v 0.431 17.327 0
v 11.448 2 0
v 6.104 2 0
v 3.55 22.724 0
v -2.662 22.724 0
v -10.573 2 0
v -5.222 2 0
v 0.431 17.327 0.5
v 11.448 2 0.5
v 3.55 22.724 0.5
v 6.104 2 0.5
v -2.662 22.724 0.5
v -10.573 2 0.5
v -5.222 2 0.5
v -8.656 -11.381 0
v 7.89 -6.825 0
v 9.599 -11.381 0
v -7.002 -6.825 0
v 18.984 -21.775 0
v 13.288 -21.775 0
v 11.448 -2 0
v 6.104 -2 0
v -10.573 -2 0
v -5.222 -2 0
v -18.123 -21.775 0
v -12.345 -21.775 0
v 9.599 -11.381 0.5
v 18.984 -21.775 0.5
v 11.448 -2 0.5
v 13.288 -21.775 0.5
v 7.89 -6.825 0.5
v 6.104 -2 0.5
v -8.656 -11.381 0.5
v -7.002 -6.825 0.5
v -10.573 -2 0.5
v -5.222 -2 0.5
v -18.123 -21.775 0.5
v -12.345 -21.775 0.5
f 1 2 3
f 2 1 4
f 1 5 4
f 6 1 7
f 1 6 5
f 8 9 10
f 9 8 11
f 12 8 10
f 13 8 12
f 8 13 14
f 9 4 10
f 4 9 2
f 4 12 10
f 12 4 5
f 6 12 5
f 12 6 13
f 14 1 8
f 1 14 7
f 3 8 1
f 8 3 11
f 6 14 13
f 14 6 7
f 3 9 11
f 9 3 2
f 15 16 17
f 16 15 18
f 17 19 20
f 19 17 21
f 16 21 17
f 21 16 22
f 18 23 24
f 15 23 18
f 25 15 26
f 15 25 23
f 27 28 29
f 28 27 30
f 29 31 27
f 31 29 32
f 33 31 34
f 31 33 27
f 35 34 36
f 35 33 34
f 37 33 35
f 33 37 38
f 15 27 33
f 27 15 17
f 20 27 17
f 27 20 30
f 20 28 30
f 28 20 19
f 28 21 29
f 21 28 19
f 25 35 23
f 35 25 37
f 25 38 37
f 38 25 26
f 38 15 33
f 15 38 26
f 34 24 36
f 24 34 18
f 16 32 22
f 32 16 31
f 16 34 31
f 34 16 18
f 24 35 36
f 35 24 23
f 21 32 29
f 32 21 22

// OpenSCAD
echo(version=version());

my_nbfaces=120;

font = "Linux Libertine Mono O";

letter_size = 40;
letter_height = 0.5;
letter_footprint = 0.2;

card_thickness = 1.3;
card_width = 39.5;
card_height = 38;

wheel_thickness = 2.5;
hole_radius = 1.2;
slack = 0.5;

letter_top="A";

module letter(l) {
	// Use linear_extrude() to make the letters 3D objects as they
	// are only 2D shapes when only using text()
	linear_extrude(height = letter_height) {
		text(l, size = letter_size, font = font, halign = "center", valign = "center", $fn = my_nbfaces);
	}
}

translate([0, 2, 0])
    difference() {
        letter(letter_top);
        rotate([0, 0, 180])
            translate([-2*card_width, 0, -letter_height])
                cube([4*card_width, 4* card_height, 2*letter_height]);
    }

translate([0, -2, 0])
    difference() {
        letter(letter_top);
        translate([-2*card_width, 0, -letter_height])
            cube([4*card_width, 4* card_height, 2*letter_height]);
    }
